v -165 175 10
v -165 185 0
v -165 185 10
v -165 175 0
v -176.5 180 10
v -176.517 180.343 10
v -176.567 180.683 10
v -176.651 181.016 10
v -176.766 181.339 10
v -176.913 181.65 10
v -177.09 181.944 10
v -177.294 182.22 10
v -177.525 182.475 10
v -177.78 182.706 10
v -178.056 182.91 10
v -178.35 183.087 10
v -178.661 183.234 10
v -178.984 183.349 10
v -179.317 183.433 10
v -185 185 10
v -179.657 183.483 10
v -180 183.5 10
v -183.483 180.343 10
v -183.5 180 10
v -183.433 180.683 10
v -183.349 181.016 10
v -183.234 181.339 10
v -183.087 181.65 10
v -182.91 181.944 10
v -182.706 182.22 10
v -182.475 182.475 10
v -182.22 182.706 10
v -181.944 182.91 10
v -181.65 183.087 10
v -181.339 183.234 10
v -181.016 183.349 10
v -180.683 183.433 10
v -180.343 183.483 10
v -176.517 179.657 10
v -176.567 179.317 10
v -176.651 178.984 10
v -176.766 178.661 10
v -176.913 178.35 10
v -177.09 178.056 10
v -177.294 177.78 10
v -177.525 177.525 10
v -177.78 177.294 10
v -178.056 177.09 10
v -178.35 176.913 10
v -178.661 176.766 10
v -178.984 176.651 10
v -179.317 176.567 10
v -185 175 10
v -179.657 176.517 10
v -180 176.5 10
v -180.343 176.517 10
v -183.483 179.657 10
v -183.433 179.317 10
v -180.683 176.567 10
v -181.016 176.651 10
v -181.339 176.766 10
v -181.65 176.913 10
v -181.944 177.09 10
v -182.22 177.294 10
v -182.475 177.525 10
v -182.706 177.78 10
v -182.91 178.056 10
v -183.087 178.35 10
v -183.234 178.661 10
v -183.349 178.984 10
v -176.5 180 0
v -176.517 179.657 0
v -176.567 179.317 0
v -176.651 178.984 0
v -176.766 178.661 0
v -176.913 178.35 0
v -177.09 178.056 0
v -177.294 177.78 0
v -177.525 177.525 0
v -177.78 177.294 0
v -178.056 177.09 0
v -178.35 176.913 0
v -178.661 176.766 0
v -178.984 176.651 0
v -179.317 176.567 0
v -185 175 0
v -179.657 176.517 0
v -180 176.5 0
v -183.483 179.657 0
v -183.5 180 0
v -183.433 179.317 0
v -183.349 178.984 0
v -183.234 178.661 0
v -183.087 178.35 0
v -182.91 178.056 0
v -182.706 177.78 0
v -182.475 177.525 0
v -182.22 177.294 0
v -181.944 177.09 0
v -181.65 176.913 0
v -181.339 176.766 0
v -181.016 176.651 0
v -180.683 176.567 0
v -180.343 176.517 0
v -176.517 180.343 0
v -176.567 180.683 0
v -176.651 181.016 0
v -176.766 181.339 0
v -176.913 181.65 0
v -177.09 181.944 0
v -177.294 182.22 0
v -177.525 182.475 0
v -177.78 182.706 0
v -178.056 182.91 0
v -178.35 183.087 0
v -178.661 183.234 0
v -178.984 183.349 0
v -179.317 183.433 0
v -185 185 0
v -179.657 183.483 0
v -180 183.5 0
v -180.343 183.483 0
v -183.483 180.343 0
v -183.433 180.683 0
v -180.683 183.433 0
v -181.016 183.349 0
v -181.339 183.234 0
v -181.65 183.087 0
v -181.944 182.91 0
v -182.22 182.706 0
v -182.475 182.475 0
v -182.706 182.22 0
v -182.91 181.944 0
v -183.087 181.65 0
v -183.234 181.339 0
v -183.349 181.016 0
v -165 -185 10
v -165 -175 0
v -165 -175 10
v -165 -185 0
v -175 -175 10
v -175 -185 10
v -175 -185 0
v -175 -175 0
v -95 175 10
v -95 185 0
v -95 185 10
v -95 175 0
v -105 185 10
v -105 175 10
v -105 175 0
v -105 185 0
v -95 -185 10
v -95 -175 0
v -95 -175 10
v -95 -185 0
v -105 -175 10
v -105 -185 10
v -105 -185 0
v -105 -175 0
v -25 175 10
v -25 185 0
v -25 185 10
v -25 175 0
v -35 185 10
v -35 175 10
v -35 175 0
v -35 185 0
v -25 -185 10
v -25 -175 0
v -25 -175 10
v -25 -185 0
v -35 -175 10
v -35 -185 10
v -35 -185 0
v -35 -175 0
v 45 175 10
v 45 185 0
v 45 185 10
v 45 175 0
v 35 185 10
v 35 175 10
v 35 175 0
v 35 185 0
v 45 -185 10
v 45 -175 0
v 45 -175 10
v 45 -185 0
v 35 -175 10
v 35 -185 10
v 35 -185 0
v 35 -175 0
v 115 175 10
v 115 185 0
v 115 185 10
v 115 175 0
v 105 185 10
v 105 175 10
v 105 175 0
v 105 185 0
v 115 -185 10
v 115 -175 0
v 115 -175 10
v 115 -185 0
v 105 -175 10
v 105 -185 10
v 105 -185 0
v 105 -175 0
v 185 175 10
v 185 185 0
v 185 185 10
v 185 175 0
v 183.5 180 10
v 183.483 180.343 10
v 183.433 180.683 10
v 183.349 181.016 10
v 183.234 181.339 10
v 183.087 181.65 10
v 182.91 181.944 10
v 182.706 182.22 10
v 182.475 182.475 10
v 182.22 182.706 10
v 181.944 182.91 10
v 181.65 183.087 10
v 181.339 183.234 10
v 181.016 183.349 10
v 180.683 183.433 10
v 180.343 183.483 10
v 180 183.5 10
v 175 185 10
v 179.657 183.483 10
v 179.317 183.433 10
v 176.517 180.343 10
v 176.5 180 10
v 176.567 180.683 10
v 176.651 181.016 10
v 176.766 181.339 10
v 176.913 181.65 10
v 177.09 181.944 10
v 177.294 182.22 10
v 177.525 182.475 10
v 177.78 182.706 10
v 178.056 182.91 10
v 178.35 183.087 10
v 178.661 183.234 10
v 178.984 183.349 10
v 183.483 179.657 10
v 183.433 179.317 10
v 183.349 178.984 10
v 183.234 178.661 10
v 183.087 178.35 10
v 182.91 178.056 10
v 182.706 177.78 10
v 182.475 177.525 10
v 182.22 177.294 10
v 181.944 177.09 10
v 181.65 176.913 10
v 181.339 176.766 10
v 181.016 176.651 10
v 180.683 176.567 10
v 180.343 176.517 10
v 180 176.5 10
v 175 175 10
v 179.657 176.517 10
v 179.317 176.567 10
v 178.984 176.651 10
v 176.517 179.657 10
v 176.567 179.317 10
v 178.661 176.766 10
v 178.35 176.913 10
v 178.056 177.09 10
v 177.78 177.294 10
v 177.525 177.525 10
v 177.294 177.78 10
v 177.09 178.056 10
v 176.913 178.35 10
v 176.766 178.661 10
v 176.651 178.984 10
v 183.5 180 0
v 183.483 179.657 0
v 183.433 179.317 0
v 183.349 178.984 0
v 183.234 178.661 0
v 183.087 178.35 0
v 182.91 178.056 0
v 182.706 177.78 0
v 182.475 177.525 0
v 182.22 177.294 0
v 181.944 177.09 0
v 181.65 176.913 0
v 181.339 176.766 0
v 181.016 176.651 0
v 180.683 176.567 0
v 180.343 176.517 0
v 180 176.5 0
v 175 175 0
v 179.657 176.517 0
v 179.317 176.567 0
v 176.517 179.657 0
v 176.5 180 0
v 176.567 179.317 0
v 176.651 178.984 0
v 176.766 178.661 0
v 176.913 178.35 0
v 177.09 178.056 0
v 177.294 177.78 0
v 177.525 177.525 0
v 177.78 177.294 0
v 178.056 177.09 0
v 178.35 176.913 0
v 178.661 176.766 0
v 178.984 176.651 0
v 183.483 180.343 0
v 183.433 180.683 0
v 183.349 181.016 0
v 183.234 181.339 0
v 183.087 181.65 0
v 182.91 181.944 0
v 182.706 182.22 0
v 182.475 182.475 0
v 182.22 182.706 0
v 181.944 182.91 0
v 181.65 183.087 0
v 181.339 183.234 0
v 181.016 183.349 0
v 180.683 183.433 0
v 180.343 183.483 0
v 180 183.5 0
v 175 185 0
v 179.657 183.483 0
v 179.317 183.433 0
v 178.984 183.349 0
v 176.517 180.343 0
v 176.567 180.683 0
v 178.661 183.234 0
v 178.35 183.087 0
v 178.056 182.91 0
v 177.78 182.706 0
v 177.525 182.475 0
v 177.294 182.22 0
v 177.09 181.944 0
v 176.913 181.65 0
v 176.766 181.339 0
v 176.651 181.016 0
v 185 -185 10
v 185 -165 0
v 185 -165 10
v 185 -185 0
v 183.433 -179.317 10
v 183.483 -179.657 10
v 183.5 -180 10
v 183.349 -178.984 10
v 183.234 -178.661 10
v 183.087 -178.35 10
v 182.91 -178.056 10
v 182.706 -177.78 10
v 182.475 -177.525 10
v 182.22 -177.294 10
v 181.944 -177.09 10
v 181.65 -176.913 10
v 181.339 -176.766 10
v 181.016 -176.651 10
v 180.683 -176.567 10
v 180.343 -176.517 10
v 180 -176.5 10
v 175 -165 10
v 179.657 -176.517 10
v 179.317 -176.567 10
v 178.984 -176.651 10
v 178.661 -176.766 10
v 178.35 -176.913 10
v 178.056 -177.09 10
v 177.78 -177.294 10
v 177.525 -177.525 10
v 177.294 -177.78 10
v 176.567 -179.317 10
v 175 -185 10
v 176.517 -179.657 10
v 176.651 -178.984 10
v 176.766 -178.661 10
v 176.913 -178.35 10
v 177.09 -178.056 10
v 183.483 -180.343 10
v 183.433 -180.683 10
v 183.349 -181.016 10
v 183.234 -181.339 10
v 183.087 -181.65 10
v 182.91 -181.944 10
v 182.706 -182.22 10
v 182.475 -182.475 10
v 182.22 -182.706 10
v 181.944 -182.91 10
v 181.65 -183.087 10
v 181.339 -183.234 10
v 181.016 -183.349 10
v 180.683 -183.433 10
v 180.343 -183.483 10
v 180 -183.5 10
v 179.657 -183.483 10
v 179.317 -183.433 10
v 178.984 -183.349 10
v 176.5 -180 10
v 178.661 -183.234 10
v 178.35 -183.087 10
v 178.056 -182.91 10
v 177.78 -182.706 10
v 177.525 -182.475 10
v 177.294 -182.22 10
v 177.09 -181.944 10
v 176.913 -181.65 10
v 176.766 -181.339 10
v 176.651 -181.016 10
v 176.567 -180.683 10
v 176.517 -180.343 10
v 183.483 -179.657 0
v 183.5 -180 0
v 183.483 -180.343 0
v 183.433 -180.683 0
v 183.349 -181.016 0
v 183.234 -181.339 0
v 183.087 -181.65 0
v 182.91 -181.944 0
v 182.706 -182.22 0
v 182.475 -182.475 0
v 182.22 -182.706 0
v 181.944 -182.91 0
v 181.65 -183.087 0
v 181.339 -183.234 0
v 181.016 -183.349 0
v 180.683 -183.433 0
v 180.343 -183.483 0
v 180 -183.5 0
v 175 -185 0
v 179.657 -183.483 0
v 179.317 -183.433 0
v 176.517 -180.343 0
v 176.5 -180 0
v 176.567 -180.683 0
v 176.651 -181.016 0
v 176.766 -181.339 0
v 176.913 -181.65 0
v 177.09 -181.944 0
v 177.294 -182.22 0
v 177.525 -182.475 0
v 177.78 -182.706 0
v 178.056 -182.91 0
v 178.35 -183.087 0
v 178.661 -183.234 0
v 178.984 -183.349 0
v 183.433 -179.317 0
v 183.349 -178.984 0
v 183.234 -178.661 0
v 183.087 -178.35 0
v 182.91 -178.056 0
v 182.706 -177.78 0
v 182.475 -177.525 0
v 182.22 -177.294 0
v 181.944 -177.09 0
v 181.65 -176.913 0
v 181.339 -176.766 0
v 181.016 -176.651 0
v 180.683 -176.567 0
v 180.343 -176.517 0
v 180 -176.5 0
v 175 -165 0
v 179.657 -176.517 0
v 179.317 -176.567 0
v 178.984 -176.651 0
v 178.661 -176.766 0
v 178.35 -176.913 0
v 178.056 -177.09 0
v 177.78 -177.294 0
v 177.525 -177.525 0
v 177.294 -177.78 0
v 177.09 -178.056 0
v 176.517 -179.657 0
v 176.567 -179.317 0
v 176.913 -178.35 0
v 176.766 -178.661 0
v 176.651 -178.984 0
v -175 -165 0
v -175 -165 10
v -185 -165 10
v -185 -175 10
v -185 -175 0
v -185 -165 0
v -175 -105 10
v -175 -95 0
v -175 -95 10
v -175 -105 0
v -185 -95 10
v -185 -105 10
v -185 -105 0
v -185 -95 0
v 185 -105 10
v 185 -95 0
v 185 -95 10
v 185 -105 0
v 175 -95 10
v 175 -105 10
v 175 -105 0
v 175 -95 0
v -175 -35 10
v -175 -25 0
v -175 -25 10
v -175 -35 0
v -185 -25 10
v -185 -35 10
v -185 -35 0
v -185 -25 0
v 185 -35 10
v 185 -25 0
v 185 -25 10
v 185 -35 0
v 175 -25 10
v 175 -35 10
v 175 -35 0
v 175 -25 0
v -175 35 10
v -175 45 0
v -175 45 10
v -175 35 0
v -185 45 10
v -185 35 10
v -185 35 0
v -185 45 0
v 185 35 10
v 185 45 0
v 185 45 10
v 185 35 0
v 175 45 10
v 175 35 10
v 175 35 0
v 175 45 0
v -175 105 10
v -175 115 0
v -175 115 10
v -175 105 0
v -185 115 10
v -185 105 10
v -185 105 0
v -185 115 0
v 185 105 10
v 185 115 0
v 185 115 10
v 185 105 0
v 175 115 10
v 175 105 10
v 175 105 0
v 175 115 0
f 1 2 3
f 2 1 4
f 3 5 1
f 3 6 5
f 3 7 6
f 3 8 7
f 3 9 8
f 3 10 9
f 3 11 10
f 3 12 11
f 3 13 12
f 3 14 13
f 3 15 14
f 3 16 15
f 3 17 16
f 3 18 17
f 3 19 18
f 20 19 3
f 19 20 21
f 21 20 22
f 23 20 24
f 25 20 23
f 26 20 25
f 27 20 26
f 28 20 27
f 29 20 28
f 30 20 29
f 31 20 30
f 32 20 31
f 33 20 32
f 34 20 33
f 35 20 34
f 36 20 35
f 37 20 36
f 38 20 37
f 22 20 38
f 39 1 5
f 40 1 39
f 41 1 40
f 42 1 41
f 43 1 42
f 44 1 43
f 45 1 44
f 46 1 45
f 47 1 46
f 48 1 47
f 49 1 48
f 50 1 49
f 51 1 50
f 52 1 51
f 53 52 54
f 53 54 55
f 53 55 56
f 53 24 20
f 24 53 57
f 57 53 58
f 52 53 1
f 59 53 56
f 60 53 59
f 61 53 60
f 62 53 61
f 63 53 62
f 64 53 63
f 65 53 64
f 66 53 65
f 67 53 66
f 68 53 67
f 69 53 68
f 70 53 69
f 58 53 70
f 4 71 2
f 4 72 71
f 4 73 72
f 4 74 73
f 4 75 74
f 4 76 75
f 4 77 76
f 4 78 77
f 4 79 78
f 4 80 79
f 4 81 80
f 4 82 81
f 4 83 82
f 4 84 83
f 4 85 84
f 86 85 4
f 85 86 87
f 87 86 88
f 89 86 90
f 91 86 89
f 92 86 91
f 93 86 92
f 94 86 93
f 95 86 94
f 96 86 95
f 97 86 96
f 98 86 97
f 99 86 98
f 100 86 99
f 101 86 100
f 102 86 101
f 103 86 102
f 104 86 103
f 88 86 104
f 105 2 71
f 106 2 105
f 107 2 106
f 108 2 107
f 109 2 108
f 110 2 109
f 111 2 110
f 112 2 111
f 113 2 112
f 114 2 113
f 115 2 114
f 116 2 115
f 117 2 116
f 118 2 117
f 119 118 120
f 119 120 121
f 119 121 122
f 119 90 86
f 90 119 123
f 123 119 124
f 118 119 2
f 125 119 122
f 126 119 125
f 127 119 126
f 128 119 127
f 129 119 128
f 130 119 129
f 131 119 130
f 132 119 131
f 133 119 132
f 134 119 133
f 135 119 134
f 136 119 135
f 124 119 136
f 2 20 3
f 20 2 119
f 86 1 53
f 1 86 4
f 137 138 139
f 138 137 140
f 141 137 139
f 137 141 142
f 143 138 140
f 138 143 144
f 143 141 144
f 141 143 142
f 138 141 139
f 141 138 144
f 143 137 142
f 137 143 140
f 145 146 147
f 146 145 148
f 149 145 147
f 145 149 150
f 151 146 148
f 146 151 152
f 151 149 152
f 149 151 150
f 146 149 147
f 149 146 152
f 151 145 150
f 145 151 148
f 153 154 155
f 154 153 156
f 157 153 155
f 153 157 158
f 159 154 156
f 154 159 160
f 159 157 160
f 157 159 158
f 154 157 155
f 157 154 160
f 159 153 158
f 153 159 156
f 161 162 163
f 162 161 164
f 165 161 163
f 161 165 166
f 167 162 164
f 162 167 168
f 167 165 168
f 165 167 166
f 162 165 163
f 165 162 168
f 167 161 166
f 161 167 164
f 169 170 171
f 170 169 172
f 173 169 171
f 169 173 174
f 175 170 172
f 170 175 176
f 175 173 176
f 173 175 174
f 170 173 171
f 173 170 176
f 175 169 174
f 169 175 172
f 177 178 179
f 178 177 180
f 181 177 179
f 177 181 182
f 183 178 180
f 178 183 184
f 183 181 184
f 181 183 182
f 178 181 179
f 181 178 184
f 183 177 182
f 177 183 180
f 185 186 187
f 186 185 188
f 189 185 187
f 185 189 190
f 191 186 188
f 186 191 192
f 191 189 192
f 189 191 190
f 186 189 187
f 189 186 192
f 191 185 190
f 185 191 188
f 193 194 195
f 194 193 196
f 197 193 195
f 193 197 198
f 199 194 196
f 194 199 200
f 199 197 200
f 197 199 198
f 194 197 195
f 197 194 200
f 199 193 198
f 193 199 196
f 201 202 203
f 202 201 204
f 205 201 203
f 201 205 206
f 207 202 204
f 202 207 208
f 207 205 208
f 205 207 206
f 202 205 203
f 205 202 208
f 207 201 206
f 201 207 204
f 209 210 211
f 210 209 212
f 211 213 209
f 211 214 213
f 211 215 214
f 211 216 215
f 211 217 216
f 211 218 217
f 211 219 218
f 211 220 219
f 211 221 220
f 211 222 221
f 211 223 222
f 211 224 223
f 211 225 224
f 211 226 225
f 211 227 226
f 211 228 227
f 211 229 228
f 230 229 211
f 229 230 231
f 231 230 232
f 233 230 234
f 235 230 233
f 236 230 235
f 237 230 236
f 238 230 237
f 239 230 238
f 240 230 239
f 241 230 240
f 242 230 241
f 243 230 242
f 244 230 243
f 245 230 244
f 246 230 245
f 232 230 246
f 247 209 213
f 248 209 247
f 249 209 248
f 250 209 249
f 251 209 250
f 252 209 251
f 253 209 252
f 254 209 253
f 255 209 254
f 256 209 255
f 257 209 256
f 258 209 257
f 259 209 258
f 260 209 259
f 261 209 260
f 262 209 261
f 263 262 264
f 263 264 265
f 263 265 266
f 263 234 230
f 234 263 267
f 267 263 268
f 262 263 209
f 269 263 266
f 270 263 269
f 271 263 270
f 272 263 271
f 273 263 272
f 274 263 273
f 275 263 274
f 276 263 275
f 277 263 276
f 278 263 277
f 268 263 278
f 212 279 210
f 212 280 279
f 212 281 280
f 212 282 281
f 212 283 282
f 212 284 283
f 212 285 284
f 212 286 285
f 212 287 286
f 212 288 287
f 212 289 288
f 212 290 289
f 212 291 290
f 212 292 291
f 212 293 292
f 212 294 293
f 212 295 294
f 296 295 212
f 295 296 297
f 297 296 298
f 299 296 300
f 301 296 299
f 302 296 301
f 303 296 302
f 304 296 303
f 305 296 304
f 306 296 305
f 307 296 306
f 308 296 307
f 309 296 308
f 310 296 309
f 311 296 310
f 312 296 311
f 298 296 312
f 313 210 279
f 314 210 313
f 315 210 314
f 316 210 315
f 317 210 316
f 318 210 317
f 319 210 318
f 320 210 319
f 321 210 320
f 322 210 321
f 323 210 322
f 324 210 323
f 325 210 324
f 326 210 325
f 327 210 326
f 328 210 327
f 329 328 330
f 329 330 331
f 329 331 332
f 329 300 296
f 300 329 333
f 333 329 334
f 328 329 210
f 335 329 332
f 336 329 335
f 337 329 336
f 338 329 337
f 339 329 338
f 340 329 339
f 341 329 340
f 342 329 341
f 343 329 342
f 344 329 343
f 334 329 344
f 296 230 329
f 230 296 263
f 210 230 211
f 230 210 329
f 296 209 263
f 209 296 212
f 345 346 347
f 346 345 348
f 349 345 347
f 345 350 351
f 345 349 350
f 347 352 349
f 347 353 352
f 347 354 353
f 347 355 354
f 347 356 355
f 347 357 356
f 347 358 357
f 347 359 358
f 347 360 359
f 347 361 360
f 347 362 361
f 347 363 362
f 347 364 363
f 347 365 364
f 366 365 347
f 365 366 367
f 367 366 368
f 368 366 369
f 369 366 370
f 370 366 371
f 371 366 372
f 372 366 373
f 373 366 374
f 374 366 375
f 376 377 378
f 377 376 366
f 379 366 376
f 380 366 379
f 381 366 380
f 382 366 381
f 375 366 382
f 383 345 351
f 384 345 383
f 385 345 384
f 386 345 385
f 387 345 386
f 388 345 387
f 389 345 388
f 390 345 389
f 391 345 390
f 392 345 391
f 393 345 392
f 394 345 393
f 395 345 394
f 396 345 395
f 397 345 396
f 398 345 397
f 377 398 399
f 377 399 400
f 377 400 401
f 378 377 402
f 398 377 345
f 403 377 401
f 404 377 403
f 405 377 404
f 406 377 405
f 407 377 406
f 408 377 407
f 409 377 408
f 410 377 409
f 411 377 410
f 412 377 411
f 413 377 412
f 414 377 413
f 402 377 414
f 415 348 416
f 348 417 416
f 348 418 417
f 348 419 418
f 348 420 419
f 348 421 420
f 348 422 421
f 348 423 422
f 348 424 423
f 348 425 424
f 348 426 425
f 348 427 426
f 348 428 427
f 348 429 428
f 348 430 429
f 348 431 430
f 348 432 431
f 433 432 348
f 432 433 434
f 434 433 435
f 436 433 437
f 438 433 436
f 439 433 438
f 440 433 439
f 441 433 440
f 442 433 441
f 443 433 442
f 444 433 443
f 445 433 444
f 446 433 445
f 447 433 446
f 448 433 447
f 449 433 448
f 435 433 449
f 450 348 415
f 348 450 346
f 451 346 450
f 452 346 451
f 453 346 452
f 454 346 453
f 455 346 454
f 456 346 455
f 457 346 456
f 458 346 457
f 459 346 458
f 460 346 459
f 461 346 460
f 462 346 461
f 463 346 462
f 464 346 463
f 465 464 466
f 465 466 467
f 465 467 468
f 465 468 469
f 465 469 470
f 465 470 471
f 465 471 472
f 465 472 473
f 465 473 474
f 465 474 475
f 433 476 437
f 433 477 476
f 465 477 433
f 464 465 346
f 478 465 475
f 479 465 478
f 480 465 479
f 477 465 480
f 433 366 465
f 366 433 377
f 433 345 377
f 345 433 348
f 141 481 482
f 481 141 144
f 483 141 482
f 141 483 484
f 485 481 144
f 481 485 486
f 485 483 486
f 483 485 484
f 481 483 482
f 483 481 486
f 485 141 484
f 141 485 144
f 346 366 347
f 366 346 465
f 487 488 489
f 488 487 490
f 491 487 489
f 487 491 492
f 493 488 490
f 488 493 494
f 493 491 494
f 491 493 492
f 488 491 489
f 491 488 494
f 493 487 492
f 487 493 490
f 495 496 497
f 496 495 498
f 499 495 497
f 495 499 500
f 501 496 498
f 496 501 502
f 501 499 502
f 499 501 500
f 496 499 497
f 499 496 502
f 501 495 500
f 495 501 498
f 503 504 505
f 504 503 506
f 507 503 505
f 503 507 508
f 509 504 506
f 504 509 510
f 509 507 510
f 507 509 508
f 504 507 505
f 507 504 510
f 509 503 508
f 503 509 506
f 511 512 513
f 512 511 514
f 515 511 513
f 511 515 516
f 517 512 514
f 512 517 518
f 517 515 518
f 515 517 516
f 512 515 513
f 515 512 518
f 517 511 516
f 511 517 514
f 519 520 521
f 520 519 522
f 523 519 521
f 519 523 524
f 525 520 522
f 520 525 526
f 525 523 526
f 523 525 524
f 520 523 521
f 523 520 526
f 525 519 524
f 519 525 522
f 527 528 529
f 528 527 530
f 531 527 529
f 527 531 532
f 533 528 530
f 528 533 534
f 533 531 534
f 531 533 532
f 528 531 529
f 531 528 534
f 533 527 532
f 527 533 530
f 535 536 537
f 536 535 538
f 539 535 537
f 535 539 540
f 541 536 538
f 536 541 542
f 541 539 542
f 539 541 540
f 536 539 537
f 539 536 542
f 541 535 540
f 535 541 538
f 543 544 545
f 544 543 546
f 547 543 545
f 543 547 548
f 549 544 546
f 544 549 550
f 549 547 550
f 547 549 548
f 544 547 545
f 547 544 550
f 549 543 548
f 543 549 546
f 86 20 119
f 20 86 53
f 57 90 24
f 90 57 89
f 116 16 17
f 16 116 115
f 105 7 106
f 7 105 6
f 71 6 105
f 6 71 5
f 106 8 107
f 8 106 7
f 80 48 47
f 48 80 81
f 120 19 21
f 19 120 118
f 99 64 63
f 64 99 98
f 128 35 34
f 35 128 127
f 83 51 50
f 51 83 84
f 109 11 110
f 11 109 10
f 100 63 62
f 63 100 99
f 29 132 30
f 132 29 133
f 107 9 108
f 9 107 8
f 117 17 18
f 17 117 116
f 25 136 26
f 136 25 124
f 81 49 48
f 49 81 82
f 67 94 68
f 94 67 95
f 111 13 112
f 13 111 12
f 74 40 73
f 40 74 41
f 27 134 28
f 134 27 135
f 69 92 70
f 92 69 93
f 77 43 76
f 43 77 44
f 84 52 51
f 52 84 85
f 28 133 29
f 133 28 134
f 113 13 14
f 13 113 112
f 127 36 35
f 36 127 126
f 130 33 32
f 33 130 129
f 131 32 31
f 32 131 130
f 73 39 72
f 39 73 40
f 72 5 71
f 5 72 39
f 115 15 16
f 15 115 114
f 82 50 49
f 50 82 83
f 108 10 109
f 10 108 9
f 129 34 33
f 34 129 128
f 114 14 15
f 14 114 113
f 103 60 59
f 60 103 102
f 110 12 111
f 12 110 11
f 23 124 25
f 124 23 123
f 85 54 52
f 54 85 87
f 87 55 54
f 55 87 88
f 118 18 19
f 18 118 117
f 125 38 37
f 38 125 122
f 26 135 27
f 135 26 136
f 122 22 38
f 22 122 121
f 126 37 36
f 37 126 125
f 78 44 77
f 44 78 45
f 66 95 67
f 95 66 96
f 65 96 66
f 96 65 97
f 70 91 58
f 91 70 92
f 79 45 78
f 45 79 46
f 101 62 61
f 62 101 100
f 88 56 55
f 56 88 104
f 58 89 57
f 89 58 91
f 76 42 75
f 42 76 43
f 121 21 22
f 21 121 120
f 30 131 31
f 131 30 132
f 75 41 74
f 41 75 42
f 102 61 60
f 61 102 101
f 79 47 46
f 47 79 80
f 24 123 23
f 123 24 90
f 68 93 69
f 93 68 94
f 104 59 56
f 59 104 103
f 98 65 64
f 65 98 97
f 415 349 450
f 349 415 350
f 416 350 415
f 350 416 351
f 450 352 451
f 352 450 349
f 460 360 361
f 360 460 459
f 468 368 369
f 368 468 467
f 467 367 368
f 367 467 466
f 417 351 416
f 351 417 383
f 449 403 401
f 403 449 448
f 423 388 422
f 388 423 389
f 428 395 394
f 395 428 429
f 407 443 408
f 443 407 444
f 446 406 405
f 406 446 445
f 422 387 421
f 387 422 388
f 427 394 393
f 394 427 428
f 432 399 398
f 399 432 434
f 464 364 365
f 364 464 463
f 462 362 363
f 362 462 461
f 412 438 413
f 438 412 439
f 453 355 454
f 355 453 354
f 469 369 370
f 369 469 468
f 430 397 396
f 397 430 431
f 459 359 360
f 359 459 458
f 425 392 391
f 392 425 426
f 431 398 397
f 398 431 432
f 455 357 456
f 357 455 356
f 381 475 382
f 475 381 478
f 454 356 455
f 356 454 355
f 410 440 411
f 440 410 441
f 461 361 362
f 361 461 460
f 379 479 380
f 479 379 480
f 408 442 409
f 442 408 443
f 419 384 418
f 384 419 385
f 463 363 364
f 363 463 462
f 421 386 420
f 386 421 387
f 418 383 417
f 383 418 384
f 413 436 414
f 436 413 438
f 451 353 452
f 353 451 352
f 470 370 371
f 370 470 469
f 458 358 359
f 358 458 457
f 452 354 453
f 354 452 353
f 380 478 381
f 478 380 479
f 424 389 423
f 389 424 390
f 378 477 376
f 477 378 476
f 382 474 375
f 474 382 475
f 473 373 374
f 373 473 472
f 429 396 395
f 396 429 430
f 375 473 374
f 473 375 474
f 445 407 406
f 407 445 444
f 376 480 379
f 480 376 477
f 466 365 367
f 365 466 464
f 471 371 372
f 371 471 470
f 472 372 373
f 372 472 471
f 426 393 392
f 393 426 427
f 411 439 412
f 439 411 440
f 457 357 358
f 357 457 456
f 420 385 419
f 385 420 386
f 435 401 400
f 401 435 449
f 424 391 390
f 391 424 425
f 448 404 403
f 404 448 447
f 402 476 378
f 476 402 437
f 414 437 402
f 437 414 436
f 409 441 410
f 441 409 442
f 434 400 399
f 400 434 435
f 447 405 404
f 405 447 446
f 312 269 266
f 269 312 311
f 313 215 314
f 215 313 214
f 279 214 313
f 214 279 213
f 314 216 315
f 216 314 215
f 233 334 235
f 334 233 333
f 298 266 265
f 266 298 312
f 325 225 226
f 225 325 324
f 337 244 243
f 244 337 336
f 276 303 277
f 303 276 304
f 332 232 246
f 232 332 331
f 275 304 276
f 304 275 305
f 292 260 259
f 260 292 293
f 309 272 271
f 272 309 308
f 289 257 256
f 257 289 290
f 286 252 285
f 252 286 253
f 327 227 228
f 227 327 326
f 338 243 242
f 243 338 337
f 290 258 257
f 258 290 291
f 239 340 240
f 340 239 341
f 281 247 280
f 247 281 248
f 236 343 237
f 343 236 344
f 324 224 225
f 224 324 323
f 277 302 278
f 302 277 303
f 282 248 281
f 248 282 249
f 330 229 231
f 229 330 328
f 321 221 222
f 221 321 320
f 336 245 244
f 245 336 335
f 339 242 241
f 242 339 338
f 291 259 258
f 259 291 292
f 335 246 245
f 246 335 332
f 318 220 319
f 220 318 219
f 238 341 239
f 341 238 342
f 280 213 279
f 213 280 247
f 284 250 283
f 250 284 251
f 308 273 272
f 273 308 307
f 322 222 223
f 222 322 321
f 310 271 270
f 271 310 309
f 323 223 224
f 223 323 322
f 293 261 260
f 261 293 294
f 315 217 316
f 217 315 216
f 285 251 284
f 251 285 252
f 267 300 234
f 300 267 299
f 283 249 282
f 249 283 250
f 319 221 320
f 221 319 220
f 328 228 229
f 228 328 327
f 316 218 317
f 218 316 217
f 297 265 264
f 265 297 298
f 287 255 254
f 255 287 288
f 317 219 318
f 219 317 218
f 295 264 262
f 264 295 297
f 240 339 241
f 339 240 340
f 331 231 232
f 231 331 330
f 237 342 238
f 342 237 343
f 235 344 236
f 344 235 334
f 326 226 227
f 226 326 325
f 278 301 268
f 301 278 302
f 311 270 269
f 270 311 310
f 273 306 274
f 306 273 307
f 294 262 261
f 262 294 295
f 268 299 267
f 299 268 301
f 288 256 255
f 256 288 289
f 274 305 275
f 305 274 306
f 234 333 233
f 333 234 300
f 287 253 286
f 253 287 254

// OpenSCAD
// ring_03.scad - ring index 3 (z bottom = 30 mm)
$fn = 64; bar = 10; half_b = bar/2; outer = 370; half_outer = outer/2;
front_y = 180; back_y = -180; left_x = -180; right_x = 180;
x_centers = [-170, -100, -30, 40, 110, 180];
z_centers = [5, 85, 155, 225, 295, 365, 435, 505, 575, 645, 715]; ring_z = 30;
module place_box(cx, cy, sx, sy) { translate([cx - sx/2, cy - sy/2, 0]) cube([sx, sy, bar]); }

difference() { union() {
    for (x = x_centers) { place_box(x, front_y, bar, bar); place_box(x, back_y, bar, bar); }
    for (y = x_centers) { place_box(left_x, y, bar, bar); place_box(right_x, y, bar, bar); }
    for (zc = z_centers) if ((zc - half_b < ring_z + bar) && (zc + half_b > ring_z)) {
        translate([-half_outer, front_y - half_b, 0]) cube([outer, bar, bar]);
        translate([-half_outer, back_y - half_b, 0])  cube([outer, bar, bar]);
        translate([left_x - half_b, -half_outer, 0])  cube([bar, outer, bar]);
        translate([right_x - half_b, -half_outer, 0]) cube([bar, outer, bar]);
    }
  }
  for (cx = [-180, 180]) for (cy = [-180, 180]) translate([cx, cy, 0]) cylinder(h = bar, r = 3.5, $fn = 64);
}
